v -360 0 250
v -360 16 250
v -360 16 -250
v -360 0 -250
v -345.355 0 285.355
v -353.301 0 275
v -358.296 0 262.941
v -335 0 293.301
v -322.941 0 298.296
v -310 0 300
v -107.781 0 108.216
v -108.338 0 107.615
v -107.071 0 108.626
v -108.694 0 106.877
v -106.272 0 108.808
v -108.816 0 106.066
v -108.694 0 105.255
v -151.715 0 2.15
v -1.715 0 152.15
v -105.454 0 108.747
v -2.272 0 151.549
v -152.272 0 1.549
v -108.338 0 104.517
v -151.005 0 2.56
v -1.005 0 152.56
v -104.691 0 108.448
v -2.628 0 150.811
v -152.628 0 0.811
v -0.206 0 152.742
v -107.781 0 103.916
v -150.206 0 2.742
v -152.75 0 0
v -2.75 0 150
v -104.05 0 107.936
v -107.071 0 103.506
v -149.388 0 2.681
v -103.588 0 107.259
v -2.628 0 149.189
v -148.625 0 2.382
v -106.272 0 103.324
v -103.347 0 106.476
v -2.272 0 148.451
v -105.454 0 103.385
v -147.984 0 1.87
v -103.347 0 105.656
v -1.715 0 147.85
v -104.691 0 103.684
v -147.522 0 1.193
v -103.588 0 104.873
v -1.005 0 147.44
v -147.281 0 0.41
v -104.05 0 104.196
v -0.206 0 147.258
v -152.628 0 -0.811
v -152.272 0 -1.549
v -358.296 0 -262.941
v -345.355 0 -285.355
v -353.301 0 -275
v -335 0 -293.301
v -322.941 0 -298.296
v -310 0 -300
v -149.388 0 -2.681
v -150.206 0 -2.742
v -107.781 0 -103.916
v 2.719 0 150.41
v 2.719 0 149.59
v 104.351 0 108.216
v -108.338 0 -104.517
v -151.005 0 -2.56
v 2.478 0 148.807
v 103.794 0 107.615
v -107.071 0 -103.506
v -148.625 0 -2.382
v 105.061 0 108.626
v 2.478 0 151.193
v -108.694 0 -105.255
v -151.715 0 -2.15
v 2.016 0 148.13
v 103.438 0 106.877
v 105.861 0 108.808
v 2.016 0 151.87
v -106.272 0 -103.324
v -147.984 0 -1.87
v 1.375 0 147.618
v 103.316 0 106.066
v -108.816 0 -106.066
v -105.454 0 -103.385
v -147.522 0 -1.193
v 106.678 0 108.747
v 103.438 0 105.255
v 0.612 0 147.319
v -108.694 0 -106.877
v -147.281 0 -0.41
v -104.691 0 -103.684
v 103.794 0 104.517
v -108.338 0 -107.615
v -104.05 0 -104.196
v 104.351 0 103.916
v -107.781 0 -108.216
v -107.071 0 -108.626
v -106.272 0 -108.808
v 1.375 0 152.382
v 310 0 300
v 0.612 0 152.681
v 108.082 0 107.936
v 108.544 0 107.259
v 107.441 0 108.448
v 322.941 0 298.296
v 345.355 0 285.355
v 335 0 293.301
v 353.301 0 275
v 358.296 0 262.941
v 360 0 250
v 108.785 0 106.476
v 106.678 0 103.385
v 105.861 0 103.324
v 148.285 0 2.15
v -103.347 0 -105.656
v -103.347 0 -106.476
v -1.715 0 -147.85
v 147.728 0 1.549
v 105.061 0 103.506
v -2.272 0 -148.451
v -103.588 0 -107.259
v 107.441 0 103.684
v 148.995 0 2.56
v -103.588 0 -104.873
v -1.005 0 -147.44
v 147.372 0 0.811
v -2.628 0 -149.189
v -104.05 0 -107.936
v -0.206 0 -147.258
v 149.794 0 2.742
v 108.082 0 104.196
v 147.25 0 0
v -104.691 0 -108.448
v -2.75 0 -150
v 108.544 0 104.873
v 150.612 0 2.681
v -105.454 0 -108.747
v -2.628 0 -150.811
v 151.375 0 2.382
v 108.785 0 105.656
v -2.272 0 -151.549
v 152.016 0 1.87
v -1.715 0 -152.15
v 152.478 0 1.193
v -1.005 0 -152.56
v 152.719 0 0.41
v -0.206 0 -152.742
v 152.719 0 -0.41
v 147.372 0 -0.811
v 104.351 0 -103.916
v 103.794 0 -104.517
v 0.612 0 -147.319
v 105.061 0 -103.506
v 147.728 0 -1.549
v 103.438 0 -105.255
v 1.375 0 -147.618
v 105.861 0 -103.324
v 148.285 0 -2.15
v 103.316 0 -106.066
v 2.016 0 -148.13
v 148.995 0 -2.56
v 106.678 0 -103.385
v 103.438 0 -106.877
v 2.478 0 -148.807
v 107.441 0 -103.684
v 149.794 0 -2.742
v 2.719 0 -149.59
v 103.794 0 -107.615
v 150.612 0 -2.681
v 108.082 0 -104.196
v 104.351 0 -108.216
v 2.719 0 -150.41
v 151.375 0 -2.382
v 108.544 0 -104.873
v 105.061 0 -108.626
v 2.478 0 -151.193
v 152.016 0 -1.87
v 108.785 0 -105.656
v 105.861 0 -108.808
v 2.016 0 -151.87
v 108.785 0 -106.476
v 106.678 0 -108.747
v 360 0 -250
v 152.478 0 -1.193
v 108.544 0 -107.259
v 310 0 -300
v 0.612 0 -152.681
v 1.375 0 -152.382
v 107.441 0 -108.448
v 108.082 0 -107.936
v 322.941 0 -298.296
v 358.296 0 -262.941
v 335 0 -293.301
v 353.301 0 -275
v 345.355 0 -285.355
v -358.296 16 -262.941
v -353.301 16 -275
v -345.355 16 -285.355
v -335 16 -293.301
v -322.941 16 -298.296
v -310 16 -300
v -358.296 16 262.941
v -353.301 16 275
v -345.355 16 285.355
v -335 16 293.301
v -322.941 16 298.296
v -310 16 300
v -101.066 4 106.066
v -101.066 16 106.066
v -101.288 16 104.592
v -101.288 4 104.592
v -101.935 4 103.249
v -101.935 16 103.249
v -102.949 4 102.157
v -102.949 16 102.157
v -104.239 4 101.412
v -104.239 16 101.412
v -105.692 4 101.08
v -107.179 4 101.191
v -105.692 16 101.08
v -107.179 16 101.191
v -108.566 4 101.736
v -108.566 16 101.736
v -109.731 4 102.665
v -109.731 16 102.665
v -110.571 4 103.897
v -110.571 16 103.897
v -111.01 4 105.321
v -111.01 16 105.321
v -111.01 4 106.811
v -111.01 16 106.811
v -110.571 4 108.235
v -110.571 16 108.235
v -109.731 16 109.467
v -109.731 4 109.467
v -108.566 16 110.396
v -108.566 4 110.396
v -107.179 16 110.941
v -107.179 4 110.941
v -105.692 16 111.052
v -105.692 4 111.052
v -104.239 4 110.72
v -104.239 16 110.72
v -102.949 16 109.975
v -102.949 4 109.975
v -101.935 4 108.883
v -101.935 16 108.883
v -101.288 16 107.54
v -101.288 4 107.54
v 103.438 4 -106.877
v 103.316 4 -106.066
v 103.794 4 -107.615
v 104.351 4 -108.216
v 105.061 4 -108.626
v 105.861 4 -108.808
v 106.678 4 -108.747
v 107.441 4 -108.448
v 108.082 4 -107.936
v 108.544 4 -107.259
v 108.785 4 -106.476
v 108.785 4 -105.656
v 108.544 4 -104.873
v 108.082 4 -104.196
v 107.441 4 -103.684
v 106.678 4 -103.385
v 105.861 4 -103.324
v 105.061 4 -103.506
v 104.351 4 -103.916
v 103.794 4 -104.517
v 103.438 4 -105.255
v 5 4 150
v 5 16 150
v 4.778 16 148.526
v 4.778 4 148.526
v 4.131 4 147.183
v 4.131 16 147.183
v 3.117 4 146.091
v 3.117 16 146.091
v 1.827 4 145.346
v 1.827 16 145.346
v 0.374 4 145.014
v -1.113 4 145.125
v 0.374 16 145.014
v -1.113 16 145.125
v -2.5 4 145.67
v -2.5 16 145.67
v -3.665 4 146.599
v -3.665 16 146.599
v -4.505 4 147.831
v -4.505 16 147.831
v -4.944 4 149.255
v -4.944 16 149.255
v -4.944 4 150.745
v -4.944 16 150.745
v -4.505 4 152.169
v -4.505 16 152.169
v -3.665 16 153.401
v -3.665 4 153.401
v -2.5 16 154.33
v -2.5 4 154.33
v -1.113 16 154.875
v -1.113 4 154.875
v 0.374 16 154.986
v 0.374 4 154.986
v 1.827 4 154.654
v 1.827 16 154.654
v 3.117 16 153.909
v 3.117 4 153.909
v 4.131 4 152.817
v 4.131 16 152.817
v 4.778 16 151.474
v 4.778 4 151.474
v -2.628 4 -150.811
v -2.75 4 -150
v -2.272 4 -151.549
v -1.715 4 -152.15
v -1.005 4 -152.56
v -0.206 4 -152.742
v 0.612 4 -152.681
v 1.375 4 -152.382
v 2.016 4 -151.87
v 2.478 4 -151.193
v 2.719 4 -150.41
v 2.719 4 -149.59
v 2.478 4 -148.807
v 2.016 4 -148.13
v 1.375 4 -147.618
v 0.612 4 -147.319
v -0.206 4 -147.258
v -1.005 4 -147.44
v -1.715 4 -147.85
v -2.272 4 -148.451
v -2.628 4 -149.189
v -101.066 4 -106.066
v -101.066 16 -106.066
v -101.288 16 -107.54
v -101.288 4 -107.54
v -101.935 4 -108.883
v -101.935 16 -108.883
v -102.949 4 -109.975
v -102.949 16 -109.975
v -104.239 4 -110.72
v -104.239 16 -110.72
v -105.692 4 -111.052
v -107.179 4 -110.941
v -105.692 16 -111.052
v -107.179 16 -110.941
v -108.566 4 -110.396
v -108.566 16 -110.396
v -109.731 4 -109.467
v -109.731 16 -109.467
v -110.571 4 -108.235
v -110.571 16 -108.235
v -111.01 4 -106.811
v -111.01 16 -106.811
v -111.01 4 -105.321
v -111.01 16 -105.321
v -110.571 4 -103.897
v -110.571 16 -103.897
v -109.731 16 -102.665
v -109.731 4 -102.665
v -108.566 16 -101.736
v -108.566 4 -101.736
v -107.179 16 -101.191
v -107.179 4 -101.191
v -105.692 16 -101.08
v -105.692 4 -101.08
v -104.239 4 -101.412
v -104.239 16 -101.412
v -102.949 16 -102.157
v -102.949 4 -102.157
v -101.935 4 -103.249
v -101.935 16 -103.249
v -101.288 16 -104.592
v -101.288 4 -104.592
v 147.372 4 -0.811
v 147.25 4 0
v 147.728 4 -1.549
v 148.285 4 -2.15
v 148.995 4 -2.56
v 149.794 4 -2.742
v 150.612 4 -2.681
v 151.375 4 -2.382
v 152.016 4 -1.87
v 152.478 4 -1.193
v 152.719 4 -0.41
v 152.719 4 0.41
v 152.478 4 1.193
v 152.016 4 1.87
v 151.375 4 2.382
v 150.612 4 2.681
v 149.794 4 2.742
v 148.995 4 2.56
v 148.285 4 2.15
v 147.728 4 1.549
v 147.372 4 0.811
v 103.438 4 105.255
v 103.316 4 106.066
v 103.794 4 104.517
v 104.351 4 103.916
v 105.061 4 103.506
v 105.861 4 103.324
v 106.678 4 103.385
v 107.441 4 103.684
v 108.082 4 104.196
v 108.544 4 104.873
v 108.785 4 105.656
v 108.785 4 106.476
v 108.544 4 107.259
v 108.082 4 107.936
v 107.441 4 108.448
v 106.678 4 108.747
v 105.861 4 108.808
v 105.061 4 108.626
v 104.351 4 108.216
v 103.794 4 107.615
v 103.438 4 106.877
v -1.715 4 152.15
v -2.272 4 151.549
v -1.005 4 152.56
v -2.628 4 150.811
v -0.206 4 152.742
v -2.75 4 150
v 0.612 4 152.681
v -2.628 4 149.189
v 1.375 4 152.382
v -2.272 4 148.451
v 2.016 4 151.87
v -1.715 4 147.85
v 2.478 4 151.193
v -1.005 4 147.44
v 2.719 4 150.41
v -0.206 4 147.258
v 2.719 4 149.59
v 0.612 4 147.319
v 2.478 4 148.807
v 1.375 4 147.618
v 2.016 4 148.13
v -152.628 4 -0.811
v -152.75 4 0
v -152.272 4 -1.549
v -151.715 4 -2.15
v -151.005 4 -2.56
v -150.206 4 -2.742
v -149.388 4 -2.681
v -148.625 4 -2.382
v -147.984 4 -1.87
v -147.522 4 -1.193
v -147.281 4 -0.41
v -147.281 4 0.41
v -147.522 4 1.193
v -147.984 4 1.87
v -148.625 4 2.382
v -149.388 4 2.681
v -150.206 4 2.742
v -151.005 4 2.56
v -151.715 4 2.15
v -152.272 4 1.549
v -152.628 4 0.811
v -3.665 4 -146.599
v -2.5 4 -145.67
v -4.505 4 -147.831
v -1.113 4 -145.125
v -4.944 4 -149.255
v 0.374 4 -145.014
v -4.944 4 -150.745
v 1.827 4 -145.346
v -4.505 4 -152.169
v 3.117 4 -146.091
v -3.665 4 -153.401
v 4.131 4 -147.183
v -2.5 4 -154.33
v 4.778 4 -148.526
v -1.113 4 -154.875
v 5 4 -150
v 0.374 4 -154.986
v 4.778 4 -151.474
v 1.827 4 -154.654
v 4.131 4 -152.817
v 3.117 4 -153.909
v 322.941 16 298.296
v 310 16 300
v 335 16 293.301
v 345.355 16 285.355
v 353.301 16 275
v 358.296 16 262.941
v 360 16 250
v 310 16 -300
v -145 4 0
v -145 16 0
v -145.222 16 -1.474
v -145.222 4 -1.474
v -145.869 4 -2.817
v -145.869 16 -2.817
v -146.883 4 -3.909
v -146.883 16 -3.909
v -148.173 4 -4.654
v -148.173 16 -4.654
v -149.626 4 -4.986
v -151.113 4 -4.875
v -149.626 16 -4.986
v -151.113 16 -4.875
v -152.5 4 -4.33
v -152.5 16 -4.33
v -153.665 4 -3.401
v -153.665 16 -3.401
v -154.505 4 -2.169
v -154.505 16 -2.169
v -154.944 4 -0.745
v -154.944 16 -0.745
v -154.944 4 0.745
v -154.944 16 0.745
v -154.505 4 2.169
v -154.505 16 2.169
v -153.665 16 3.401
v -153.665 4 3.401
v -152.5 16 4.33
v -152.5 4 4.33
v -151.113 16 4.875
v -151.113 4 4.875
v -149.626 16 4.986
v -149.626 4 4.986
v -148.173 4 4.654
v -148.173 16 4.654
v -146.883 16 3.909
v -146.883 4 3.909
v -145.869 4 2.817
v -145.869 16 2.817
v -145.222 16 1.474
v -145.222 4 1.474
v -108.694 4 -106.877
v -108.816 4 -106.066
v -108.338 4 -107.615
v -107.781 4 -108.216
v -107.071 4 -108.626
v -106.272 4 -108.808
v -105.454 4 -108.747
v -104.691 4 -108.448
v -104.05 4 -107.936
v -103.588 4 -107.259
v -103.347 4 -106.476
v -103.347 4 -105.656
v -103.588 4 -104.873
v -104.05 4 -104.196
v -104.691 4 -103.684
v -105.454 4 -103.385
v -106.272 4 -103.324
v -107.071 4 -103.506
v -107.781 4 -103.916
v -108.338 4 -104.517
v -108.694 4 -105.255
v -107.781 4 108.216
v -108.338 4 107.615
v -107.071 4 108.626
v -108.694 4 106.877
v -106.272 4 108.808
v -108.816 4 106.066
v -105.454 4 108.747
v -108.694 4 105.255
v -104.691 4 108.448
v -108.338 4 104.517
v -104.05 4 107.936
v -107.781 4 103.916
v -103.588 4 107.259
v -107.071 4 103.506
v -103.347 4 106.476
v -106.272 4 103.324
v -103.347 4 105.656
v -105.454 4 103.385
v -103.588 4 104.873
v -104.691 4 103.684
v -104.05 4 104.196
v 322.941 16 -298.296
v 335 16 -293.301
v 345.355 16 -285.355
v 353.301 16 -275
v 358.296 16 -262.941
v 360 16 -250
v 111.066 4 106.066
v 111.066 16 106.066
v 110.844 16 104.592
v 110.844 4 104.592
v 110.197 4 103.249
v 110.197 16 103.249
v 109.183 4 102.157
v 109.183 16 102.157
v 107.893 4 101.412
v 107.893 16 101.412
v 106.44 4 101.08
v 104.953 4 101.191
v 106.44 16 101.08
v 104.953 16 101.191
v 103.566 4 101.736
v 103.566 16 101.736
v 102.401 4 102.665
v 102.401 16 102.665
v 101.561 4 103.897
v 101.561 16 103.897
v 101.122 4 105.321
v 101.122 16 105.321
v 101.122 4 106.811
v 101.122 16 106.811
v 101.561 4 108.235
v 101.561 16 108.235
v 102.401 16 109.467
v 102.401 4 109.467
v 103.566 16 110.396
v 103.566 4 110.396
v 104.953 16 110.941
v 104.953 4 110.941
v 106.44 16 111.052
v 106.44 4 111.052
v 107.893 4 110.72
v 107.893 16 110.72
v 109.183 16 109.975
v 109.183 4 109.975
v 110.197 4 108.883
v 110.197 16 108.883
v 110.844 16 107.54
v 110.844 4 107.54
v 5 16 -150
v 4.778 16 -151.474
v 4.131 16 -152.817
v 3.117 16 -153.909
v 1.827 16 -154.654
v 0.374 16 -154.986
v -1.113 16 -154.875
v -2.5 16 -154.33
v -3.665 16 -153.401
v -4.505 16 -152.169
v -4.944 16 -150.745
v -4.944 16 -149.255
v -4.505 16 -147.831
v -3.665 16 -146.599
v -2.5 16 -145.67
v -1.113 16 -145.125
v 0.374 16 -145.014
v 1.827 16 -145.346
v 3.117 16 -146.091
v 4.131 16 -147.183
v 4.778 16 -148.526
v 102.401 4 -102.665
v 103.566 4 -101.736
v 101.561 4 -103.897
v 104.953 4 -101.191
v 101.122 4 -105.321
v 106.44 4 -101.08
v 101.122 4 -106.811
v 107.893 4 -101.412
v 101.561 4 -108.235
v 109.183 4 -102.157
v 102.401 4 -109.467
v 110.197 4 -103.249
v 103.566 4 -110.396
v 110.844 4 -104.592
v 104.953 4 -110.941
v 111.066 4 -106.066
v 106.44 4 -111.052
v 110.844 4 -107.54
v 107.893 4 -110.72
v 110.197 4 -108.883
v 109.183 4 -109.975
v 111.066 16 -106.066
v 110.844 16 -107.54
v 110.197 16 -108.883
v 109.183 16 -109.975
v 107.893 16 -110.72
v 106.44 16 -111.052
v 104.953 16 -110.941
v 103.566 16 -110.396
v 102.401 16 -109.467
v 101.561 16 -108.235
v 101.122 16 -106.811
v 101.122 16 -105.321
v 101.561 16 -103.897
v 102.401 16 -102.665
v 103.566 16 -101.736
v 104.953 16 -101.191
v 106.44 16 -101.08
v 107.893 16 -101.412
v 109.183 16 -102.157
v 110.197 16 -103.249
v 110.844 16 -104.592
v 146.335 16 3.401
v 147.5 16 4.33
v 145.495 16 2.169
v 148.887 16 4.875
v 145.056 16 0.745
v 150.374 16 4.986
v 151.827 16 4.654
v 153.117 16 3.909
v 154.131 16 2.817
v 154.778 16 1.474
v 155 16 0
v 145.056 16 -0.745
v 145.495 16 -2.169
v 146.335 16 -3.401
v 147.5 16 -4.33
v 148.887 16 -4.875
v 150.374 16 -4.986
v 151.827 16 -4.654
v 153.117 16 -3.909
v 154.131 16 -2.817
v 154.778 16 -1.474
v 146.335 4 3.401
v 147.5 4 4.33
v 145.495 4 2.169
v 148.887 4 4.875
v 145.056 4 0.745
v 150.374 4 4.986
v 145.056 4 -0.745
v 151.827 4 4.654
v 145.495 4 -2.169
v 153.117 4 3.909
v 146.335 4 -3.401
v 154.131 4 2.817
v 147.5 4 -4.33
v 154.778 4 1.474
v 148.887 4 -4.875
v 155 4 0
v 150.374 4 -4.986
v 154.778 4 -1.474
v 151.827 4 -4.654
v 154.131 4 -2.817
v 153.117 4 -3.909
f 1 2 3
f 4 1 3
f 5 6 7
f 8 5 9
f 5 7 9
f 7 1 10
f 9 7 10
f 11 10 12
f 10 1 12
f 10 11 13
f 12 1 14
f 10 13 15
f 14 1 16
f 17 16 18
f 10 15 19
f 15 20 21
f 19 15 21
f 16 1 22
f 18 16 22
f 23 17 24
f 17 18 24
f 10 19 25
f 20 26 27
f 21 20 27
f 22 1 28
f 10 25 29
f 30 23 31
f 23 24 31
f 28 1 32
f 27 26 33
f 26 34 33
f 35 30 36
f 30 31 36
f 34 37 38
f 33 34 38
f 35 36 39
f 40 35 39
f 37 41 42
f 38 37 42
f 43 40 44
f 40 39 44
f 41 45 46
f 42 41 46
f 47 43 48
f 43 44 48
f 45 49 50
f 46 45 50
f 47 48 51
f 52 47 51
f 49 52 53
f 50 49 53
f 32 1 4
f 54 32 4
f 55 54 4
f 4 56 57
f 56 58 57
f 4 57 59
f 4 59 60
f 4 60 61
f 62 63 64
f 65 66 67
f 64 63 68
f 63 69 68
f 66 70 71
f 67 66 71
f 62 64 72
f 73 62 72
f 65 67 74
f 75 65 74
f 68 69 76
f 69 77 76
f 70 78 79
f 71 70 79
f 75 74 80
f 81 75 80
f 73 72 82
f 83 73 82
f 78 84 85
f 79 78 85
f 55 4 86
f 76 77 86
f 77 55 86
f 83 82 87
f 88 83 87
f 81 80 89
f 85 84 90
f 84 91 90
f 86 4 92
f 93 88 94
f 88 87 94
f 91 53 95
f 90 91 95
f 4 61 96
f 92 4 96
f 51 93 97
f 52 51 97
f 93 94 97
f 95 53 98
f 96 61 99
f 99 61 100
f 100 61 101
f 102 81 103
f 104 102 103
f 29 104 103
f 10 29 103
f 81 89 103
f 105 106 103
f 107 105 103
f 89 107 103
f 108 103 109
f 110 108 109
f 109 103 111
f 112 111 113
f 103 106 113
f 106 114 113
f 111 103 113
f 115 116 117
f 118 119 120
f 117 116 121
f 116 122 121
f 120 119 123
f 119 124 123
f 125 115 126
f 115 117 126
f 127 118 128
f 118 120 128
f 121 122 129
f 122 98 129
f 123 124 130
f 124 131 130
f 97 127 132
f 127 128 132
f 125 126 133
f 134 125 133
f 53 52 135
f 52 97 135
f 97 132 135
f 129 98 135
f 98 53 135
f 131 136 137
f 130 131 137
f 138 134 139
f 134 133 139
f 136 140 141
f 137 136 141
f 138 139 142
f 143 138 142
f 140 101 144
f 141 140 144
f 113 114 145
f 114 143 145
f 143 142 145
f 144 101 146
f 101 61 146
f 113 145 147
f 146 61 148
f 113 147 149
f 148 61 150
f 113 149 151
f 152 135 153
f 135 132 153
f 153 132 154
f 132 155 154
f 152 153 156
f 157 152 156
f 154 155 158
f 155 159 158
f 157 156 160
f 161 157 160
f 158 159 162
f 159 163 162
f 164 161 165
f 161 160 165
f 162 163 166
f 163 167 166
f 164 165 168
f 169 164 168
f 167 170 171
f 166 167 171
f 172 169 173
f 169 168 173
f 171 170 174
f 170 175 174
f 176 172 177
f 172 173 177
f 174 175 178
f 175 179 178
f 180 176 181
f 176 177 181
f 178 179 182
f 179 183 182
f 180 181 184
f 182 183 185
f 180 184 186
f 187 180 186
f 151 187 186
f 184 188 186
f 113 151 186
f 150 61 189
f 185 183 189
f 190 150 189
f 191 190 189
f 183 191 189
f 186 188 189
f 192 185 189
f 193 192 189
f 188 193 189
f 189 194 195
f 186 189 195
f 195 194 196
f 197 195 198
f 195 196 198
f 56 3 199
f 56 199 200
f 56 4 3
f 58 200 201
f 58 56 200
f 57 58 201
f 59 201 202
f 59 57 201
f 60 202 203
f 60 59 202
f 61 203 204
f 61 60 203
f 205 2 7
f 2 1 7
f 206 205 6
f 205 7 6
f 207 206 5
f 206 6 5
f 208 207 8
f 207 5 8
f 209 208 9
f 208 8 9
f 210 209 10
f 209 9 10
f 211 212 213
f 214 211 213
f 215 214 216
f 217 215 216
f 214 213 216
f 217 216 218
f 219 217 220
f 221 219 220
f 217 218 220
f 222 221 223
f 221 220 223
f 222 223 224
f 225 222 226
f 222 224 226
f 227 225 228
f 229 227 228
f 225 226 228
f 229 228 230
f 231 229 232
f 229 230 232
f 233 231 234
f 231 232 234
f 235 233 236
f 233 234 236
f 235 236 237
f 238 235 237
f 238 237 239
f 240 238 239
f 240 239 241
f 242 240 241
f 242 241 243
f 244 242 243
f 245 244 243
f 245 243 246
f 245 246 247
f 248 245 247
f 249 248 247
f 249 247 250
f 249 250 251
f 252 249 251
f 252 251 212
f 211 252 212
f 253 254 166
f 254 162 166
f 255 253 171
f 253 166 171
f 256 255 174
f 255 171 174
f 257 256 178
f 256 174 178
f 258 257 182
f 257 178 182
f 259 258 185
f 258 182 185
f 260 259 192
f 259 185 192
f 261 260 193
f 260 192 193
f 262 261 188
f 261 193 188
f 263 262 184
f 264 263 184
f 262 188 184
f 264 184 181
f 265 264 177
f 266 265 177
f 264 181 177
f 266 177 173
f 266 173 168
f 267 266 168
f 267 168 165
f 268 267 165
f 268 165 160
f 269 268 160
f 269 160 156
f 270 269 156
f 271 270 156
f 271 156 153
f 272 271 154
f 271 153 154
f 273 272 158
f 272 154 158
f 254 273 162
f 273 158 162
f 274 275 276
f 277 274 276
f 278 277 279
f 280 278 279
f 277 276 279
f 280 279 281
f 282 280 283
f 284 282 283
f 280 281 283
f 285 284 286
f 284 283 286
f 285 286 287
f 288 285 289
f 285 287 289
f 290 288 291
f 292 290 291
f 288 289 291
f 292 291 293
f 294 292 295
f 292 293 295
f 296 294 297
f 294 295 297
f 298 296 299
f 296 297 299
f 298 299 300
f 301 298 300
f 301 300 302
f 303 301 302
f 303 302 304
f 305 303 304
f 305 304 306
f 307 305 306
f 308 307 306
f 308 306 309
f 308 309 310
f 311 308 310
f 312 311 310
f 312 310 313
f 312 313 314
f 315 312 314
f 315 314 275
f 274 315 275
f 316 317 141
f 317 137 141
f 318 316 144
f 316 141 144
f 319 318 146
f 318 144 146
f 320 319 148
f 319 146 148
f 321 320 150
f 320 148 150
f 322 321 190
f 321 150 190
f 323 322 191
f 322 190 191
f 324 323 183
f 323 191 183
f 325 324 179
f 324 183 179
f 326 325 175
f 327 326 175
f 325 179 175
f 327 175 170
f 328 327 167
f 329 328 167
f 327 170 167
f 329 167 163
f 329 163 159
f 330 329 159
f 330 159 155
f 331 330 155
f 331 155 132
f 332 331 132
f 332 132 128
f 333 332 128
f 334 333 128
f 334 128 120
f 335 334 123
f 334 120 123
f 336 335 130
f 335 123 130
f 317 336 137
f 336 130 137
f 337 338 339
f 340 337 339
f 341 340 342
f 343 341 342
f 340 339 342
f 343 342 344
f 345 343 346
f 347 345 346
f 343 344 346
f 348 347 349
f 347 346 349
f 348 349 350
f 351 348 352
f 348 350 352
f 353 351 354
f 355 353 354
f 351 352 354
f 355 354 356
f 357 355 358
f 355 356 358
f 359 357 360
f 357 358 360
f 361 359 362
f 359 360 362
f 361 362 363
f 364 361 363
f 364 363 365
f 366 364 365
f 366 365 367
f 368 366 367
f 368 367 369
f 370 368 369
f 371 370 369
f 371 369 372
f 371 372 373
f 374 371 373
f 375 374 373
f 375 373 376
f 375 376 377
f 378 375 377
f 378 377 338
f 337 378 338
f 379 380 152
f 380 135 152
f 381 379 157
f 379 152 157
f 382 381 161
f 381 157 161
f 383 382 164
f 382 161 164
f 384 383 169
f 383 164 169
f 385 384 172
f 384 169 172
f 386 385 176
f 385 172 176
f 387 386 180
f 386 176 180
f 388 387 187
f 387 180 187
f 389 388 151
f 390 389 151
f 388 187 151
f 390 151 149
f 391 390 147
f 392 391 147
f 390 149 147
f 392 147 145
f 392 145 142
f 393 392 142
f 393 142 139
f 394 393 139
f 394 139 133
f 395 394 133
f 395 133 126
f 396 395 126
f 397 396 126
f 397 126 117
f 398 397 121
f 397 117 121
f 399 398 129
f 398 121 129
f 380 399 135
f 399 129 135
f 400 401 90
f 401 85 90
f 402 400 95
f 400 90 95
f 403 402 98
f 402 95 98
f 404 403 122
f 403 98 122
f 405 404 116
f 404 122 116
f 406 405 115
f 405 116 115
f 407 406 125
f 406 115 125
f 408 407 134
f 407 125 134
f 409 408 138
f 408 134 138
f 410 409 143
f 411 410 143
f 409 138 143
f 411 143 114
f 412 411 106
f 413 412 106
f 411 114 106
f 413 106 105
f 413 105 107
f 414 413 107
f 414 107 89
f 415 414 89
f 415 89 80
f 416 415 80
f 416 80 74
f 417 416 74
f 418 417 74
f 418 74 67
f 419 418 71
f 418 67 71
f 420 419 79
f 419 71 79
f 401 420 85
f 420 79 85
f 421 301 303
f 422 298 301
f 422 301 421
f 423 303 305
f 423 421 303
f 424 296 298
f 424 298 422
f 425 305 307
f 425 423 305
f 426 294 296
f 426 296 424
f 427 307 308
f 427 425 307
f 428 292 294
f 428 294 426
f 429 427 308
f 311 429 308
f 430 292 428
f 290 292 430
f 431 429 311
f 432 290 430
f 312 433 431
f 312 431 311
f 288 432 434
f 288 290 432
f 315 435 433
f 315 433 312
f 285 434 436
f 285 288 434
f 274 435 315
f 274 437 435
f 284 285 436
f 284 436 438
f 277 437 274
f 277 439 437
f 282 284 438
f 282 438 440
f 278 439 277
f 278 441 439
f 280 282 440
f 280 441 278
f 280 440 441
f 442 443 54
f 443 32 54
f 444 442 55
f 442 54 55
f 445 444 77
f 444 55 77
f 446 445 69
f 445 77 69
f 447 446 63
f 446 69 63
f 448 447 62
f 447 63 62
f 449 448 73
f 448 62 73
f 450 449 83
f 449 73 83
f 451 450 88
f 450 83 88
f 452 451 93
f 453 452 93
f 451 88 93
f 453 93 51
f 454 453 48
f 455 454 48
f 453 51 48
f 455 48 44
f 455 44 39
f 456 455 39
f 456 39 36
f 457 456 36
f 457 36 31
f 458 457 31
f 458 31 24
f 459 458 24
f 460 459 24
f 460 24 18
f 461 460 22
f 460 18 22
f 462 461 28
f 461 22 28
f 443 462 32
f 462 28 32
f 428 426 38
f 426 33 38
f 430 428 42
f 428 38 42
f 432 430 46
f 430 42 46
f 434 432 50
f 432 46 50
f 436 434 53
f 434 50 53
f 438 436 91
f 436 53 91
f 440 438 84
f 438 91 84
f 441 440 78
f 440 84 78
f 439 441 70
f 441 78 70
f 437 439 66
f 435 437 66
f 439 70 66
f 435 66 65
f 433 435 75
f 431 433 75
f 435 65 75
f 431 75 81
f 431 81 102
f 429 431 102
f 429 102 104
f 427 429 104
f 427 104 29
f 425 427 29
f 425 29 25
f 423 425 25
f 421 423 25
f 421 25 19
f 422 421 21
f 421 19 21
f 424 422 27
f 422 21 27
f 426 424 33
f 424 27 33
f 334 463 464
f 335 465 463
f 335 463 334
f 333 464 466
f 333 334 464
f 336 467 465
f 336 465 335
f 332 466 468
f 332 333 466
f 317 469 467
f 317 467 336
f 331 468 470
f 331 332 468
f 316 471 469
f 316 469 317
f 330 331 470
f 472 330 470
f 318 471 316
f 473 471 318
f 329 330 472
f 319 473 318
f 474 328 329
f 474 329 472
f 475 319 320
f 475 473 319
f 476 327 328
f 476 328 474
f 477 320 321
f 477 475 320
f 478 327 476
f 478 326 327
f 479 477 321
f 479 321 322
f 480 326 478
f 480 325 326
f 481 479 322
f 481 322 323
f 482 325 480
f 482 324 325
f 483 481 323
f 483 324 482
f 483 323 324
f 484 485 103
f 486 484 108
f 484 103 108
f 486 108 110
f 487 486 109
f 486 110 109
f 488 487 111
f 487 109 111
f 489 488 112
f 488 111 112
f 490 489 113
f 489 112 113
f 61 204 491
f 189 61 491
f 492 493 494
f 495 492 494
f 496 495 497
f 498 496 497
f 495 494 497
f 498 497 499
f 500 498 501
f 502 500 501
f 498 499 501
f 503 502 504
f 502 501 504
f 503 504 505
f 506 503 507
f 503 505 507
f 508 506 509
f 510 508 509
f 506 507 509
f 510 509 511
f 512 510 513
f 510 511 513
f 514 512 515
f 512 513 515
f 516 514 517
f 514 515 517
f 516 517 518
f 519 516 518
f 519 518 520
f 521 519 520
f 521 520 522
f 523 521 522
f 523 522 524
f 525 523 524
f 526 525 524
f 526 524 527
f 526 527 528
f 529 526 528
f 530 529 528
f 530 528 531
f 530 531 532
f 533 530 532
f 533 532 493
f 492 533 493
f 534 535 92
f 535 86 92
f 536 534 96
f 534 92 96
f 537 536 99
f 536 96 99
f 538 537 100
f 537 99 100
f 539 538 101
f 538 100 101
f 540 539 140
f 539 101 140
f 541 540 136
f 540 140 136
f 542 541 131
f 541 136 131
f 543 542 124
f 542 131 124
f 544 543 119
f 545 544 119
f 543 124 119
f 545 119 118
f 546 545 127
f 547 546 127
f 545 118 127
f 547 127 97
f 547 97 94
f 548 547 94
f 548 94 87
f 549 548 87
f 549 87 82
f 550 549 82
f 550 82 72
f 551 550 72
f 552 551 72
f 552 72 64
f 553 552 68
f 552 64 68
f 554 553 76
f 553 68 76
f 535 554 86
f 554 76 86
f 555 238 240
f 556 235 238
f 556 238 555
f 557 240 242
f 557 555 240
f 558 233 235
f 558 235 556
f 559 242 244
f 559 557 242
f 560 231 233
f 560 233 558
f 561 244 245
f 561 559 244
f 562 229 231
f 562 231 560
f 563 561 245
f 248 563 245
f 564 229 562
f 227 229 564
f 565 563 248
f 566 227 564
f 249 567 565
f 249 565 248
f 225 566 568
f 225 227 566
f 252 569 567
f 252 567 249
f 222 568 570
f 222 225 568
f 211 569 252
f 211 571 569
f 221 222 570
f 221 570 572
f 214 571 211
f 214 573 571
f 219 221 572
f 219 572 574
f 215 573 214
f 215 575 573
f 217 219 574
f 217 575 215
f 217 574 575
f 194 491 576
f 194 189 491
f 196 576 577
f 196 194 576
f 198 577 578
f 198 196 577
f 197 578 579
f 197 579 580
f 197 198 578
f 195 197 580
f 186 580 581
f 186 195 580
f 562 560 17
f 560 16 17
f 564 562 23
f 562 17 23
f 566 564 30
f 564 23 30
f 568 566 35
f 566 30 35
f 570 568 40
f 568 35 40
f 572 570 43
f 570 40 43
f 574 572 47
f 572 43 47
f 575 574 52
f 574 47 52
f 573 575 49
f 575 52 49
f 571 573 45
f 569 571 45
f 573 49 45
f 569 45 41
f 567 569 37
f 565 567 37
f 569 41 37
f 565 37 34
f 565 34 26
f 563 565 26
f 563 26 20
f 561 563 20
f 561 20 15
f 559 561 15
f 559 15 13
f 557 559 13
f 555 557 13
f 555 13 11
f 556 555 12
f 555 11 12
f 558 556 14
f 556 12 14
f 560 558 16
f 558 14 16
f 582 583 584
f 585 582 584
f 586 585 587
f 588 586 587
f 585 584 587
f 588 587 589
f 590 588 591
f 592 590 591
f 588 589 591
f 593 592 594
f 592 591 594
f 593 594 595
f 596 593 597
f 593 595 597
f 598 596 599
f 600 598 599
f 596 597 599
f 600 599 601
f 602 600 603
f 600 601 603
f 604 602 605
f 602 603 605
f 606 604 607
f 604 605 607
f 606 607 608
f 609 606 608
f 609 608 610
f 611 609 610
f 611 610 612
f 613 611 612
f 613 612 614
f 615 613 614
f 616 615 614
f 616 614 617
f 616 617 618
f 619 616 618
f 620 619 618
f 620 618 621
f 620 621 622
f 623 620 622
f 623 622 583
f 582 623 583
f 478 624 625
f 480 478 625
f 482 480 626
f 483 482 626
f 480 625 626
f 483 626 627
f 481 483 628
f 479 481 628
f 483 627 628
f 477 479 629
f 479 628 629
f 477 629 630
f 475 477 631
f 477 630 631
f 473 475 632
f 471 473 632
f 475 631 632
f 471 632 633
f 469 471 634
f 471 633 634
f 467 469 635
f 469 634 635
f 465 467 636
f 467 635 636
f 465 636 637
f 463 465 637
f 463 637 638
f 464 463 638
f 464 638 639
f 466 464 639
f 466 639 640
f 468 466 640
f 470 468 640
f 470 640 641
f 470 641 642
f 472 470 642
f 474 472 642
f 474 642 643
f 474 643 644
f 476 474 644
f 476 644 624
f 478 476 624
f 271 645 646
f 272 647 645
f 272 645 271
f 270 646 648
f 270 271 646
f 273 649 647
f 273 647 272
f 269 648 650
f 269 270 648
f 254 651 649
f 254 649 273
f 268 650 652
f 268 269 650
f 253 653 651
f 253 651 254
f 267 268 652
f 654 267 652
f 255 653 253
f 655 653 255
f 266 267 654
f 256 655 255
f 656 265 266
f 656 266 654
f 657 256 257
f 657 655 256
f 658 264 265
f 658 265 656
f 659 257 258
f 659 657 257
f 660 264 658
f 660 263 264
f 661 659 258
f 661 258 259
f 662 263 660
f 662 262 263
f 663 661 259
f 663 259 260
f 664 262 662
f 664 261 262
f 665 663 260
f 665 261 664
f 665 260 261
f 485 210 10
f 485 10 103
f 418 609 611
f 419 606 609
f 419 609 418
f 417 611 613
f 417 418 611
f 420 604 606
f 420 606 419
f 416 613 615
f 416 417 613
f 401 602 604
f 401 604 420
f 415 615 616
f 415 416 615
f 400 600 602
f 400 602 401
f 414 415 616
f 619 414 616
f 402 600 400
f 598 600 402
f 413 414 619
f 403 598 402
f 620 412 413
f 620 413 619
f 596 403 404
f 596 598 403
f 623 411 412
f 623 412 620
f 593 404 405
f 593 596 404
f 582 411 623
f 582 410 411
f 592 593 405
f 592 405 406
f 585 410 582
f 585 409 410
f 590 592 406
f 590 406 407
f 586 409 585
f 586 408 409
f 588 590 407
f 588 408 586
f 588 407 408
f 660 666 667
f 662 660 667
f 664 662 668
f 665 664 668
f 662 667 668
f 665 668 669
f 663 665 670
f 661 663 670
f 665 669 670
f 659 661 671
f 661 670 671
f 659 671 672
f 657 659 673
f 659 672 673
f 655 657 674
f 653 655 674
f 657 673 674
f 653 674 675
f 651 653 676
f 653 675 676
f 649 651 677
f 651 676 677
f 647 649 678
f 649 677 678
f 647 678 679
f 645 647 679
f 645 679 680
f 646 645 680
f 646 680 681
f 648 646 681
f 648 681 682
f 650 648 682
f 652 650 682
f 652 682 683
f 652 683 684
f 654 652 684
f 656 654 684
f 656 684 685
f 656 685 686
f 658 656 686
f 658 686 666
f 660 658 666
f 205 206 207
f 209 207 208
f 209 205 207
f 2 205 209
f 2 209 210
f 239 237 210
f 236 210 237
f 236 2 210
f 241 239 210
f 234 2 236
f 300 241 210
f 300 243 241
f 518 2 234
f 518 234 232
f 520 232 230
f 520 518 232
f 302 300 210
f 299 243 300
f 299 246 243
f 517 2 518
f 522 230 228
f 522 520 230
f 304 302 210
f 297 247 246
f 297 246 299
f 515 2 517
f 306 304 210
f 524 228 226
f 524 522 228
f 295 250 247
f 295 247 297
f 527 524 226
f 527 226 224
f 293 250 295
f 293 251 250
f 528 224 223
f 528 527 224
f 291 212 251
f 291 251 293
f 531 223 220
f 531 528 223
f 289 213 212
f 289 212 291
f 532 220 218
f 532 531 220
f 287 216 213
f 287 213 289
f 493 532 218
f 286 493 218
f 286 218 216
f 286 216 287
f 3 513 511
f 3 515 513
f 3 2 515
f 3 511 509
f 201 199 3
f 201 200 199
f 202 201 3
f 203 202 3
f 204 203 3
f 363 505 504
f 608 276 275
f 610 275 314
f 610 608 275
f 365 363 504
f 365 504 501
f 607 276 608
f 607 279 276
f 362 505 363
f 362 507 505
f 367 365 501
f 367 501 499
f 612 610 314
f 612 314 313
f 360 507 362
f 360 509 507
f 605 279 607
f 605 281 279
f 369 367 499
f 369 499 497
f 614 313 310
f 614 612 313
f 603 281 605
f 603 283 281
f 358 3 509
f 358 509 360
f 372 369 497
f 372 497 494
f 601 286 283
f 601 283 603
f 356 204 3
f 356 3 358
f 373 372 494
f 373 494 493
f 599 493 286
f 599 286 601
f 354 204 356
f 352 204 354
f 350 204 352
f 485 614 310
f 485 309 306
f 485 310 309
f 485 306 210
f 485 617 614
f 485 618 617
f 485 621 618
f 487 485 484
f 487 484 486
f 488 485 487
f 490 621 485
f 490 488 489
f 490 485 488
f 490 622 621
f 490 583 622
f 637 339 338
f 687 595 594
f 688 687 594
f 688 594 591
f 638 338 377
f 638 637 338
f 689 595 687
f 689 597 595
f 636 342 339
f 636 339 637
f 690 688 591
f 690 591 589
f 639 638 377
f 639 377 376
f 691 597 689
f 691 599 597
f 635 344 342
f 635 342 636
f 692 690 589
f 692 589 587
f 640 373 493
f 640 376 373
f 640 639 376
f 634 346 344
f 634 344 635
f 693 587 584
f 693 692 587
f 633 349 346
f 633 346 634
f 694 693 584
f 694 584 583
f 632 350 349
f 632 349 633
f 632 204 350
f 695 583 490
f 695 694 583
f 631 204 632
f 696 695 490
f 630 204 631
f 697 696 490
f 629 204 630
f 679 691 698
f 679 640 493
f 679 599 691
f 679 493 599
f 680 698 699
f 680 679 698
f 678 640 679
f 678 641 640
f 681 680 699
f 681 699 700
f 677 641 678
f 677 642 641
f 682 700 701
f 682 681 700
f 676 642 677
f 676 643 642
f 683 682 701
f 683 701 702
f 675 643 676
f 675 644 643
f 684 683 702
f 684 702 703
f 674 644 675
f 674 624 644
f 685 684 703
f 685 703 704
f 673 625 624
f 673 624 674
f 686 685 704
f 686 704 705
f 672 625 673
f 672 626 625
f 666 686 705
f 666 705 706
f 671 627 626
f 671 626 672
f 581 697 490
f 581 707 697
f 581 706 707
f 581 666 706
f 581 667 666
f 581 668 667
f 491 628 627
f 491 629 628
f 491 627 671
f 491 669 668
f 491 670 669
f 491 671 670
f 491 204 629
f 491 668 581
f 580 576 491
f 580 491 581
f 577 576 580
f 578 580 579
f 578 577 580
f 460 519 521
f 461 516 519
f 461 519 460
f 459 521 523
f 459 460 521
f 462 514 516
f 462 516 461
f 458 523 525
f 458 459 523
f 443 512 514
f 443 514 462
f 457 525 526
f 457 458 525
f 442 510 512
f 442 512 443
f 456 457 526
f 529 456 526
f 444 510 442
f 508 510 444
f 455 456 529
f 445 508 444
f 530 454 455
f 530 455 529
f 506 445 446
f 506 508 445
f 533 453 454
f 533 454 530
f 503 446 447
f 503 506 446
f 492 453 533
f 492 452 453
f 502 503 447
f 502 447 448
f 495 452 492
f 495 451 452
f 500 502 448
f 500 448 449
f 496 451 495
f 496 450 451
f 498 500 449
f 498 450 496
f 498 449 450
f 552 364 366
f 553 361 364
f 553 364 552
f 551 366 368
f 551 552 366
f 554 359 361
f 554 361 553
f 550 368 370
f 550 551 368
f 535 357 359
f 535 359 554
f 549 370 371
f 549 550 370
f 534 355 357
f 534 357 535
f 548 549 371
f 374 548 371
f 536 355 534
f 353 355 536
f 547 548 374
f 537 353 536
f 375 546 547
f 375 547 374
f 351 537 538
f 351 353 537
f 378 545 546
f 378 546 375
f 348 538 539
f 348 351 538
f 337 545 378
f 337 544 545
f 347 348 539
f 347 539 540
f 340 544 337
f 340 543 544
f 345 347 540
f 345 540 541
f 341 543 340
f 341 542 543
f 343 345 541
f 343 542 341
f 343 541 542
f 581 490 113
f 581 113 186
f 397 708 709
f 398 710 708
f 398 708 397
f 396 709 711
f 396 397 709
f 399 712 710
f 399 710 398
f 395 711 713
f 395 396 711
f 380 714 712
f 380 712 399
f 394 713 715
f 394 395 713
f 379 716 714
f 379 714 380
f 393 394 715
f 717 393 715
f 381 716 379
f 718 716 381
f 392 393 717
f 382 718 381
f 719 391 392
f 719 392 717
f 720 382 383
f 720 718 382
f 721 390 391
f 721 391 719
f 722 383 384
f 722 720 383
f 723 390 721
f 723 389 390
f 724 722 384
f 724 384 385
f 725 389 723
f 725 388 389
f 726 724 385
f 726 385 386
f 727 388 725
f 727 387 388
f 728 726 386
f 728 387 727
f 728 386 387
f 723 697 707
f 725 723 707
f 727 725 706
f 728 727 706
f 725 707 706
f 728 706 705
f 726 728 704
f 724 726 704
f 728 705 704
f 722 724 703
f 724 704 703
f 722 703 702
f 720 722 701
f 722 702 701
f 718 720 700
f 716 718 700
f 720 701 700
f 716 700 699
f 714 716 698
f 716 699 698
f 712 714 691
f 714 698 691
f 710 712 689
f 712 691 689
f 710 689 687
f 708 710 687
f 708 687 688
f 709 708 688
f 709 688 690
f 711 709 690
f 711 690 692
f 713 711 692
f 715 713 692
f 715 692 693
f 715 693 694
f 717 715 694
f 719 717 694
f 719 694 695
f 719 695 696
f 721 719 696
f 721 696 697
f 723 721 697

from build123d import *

# Parameters (mm, degrees)
SKETCH_1_W                   = 720
SKETCH_1_H                   = 600
EXTRUDE_1_DEPTH              = 16
HOLE_WIZARD_M5_1_D           = 5.5
HOLE_WIZARD_M5_1_CBORE_D     = 10
HOLE_WIZARD_M5_1_CBORE_DEPTH = 12
FILLET_1_R                   = 50


with BuildPart() as part:
    # 草图1 → 凸台-拉伸1 (new body)
    with BuildSketch(Plane(origin=(0, 16, 0), x_dir=(1, 0, 0), z_dir=(0, 1, 0))):
        Rectangle(SKETCH_1_W, SKETCH_1_H)
    extrude(amount=-EXTRUDE_1_DEPTH)

    # M5 六角头螺栓的柱形沉头孔1 (through all)
    with Locations(Plane(origin=(0, 16, 0), x_dir=(1, 0, 0), z_dir=(0, 1, 0))):
        with Locations((106.066017178, -106.066017178), (0, -150), (-106.066017178, -106.066017178), (-150, 0), (-106.066017178, 106.066017178), (0, 150), (106.066017178, 106.066017178), (150, 0)):
            CounterBoreHole(HOLE_WIZARD_M5_1_D / 2, HOLE_WIZARD_M5_1_CBORE_D / 2, HOLE_WIZARD_M5_1_CBORE_DEPTH)

    # 圆角1
    fillet_1_edges = [part.edges().sort_by_distance(p)[0] for p in [
        (-360, 8, -300),
        (360, 8, -300),
        (360, 8, 300),
        (-360, 8, 300),
    ]]
    fillet(fillet_1_edges, radius=FILLET_1_R)


solid = part.part
